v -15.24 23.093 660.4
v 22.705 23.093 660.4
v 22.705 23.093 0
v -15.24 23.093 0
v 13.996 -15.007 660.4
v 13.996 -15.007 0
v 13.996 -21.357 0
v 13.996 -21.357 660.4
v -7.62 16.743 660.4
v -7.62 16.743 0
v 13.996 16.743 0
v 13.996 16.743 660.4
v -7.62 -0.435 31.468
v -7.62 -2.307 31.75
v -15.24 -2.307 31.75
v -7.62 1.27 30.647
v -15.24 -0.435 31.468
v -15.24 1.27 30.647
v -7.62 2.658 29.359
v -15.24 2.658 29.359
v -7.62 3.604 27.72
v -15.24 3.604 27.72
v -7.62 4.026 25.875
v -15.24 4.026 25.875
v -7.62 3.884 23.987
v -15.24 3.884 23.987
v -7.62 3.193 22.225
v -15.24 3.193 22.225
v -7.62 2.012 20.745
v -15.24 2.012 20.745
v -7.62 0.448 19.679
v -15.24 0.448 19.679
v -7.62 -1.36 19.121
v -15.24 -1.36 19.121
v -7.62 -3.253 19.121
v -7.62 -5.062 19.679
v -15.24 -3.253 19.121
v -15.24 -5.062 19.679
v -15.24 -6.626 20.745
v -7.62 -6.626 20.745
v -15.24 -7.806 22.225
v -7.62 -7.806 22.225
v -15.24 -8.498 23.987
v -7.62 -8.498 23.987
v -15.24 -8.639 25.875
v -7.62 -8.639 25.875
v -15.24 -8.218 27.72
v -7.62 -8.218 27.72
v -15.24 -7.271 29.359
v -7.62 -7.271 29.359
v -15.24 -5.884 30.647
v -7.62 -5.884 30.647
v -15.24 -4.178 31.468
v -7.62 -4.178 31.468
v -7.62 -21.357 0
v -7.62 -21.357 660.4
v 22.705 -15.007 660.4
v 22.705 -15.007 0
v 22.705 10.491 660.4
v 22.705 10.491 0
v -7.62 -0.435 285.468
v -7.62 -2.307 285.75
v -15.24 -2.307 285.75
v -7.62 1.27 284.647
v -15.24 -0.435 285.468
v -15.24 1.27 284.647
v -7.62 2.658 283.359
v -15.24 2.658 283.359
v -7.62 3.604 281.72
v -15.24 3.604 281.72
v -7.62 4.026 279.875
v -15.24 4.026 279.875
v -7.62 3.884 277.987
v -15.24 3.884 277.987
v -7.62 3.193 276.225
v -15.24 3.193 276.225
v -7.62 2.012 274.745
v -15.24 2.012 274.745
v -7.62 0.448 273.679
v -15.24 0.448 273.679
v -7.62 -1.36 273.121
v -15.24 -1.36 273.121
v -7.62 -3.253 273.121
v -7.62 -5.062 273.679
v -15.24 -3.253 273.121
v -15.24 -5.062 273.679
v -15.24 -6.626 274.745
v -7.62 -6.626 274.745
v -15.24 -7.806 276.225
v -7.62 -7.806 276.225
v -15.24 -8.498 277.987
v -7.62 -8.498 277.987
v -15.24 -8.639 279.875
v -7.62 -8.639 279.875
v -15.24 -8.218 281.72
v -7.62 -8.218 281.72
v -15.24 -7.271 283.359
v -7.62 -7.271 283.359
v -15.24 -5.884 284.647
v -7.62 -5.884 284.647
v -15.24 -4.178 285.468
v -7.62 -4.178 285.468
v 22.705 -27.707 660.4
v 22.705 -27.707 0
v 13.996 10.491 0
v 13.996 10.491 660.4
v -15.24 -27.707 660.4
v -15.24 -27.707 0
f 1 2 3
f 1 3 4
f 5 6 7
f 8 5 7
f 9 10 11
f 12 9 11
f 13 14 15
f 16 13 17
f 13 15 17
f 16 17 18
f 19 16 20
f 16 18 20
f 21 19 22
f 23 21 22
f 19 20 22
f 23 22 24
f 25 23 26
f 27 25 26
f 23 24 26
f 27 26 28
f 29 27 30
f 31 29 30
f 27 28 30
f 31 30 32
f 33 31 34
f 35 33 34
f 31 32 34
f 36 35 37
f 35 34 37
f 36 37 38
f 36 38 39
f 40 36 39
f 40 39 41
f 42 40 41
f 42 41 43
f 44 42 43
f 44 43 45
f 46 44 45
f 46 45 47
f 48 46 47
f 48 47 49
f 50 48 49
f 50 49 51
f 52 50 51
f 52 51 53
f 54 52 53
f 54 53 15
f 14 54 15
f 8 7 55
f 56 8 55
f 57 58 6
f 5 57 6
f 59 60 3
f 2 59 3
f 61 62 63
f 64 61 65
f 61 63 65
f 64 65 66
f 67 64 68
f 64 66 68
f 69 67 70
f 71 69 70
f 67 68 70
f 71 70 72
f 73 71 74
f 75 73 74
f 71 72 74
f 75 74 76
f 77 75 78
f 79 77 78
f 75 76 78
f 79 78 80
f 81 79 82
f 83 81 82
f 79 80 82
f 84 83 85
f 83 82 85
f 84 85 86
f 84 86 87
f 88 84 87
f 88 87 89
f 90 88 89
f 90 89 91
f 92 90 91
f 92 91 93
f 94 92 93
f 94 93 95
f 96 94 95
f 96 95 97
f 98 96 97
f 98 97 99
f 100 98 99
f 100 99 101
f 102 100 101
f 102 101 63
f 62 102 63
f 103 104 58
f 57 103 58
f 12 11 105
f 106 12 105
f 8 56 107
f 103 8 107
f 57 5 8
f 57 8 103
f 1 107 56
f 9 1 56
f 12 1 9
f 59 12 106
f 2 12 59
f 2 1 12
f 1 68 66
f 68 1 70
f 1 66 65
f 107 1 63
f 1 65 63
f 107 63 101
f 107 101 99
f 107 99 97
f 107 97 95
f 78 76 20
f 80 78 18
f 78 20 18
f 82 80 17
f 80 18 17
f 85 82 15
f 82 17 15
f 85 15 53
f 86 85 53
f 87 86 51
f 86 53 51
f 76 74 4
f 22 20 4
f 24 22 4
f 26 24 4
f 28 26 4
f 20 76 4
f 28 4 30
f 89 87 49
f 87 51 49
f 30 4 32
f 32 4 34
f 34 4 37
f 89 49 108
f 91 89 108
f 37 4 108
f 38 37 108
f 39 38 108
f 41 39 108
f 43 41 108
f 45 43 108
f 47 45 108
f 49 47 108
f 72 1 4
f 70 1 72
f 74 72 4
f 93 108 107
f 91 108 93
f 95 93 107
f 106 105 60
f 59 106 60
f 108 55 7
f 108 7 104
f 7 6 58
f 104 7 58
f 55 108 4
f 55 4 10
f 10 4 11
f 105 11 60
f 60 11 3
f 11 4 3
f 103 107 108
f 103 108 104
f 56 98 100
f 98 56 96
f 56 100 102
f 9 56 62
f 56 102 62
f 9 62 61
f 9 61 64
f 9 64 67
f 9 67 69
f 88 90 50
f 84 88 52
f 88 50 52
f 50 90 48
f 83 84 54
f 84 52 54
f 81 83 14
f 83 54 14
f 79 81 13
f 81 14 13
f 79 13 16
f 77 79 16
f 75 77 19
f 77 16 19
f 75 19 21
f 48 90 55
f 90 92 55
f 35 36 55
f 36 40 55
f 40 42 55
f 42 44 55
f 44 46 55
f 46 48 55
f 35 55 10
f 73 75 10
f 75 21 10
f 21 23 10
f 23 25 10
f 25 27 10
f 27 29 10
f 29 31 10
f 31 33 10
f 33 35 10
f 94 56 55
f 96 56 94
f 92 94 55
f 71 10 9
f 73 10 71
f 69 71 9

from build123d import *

# Parameters (mm, degrees)
BOSS_EXTRUDE1_DEPTH = 660.4
SKETCH2_R           = 6.35
CUT_EXTRUDE1_DEPTH  = 38.944489796


with BuildPart() as part:
    # Sketch1 → Boss-Extrude1 (new body)
    with BuildSketch(Plane.XY):
        Polygon((13.996027612, 10.491268563), (22.704599041, 10.491268563), (22.704599041, 23.093265306), (-15.239890755, 23.093265306), (-15.239890755, -27.706734694), (22.704599041, -27.706734694), (22.704599041, -15.006734694), (13.996027612, -15.006734694), (13.996027612, -21.356734694), (-7.619890755, -21.356734694), (-7.619890755, 16.743265306), (13.996027612, 16.743265306), align=None)
    extrude(amount=BOSS_EXTRUDE1_DEPTH)

    # Sketch2 → Cut-Extrude1 (cut, through all)
    with BuildSketch(Plane.ZY.offset(15.239890755)):
        with Locations((25.4, -2.306734694)):
            Circle(SKETCH2_R)
        with Locations((279.4, -2.306734694)):
            Circle(SKETCH2_R)
    extrude(amount=-CUT_EXTRUDE1_DEPTH, mode=Mode.SUBTRACT)


solid = part.part
